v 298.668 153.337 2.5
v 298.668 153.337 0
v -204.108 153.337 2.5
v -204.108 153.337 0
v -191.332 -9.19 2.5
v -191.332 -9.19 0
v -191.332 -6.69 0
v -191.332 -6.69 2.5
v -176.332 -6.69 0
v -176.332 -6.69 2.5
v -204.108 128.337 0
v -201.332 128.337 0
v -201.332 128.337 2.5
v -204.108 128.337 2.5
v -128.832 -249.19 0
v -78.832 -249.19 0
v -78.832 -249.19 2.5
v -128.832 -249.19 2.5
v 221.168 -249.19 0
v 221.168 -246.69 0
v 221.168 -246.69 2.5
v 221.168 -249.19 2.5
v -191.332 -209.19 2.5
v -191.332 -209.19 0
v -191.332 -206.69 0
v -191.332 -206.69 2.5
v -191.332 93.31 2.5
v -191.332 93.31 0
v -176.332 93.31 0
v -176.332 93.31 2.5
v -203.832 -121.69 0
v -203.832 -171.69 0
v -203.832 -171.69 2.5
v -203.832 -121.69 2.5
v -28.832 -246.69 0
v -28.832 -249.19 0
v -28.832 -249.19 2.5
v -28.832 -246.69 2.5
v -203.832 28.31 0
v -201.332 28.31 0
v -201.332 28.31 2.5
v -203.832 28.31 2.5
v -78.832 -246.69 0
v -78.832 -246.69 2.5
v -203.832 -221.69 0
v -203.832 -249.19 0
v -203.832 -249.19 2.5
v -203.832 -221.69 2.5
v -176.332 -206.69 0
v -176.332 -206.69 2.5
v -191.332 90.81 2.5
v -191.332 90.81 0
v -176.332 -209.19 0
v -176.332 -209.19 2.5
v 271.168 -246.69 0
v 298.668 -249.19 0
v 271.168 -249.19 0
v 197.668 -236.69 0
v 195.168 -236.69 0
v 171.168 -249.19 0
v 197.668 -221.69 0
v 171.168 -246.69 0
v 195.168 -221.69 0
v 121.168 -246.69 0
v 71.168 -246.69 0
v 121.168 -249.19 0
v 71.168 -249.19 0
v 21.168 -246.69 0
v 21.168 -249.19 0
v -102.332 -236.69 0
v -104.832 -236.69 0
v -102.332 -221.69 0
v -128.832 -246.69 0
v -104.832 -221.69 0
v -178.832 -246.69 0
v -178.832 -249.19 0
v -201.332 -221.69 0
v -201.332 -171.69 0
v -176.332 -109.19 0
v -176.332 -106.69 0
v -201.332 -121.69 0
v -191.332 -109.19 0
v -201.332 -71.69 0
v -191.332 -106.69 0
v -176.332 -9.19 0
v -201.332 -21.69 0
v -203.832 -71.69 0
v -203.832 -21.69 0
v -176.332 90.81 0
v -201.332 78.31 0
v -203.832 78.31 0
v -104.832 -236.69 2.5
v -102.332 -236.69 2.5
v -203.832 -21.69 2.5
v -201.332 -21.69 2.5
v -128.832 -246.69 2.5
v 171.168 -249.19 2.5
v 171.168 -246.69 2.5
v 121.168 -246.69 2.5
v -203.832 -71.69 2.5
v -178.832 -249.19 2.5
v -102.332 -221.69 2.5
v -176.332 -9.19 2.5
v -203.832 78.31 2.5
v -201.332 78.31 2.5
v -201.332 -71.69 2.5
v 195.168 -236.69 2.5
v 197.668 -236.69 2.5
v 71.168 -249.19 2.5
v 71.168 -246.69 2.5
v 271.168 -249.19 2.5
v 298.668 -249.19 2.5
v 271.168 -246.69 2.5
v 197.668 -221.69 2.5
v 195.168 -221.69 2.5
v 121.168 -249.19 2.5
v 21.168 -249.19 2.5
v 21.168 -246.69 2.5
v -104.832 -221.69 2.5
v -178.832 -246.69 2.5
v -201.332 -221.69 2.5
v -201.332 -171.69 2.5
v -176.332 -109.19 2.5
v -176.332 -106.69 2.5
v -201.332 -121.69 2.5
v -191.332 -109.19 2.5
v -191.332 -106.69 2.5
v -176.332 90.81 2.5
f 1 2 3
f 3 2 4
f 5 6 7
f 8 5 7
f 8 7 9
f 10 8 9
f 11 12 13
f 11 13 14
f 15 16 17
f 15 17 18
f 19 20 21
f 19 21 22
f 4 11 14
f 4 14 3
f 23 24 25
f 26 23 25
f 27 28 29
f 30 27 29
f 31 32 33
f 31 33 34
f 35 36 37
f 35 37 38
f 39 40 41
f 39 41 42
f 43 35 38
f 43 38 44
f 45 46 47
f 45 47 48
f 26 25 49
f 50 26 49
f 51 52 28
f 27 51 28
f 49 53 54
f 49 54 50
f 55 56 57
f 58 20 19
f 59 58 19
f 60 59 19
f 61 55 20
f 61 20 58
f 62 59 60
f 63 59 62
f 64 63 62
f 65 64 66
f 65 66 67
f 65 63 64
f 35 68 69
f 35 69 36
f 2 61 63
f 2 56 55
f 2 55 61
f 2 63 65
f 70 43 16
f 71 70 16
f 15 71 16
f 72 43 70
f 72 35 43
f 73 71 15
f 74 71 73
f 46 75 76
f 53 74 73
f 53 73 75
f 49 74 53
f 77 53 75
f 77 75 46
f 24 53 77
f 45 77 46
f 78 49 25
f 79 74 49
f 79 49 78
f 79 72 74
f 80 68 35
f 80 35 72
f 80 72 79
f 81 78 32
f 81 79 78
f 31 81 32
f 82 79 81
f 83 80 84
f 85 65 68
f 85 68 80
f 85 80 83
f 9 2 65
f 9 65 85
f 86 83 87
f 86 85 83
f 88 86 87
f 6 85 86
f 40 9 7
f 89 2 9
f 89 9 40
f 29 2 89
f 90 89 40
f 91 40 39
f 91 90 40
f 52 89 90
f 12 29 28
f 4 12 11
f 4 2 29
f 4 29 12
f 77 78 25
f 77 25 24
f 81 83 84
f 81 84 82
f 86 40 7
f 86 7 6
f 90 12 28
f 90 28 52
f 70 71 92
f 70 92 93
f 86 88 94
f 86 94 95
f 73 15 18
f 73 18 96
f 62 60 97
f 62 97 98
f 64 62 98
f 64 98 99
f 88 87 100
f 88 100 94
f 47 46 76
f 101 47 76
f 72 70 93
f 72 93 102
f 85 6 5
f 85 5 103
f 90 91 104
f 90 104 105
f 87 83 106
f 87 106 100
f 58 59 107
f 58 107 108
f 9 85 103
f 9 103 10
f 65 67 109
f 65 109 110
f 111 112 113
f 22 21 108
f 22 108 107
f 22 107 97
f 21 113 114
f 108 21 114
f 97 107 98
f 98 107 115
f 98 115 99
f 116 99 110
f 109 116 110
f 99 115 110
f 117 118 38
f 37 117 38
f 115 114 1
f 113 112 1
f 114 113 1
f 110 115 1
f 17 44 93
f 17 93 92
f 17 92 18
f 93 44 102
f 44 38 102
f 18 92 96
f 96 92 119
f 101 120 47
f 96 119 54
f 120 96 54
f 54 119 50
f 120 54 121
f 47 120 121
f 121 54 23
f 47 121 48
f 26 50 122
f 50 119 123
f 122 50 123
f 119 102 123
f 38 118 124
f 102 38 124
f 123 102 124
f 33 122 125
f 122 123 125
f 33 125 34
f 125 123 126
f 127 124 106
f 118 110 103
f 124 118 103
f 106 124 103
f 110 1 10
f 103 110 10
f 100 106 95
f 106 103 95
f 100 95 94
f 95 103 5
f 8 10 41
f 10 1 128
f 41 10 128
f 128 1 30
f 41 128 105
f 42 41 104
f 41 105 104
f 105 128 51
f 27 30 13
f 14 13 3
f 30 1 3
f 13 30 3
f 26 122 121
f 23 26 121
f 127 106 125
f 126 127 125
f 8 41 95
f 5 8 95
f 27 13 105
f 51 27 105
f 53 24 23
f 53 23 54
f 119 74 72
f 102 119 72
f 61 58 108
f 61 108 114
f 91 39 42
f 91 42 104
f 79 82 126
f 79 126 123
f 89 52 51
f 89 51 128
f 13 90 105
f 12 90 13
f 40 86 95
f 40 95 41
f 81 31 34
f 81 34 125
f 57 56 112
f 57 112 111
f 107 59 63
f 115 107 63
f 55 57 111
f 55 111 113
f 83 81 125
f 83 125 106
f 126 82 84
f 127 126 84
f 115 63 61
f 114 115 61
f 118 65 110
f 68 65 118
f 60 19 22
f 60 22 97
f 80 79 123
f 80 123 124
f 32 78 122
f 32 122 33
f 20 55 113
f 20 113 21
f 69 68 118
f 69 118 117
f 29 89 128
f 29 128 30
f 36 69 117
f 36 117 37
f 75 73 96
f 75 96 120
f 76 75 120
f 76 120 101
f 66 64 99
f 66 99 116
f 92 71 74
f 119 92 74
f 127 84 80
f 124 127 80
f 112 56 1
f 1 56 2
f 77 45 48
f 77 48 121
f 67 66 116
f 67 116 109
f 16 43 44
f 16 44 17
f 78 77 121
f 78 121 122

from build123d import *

# Parameters (mm, degrees)
SKETCH1_W           = 15
SKETCH1_H           = 2.5
SKETCH1_W_2         = 2.5
SKETCH1_H_2         = 15
BOSS_EXTRUDE1_DEPTH = 2.5


with BuildPart() as part:
    # Sketch1 → Boss-Extrude1 (new body)
    with BuildSketch(Plane.XY):
        Polygon((-178.831793337, 153.336874277), (298.668206663, 153.336874277), (298.668206663, 135.823489403), (298.668206663, -229.176510597), (298.668206663, -249.18989547), (271.168206663, -249.18989547), (271.168206662, -246.68989547), (221.168206662, -246.68989547), (221.168206662, -249.18989547), (171.168206662, -249.18989547), (171.168206662, -246.68989547), (121.168206662, -246.68989547), (121.168206662, -249.18989547), (71.168206663, -249.18989547), (71.168206663, -246.68989547), (21.168206663, -246.68989547), (21.168206663, -249.18989547), (-28.831793337, -249.18989547), (-28.831793337, -246.68989547), (-78.831793337, -246.68989547), (-78.831793337, -249.18989547), (-128.831793337, -249.18989547), (-128.831793337, -246.68989547), (-178.831793337, -246.68989547), (-178.831793337, -249.18989547), (-201.331793337, -249.18989547), (-203.831793337, -249.18989547), (-203.831793337, -221.68989547), (-201.331793337, -221.68989547), (-201.331793337, -171.68989547), (-203.831793337, -171.68989547), (-203.831793337, -121.68989547), (-201.331793337, -121.68989547), (-201.331793337, -71.68989547), (-203.831793337, -71.68989547), (-203.831793337, -21.68989547), (-201.331793337, -21.68989547), (-201.331793337, 28.31010453), (-203.831793337, 28.31010453), (-203.831793337, 78.31010453), (-201.331793337, 78.31010453), (-201.331793337, 128.336874277), (-204.108332232, 128.336874277), (-204.108332232, 153.336874277), (-201.718717054, 153.336874277), align=None)
        with Locations((-183.831793337, -107.93989547)):
            Rectangle(SKETCH1_W, SKETCH1_H, mode=Mode.SUBTRACT)
        with Locations((-183.831793337, -207.93989547)):
            Rectangle(SKETCH1_W, SKETCH1_H, mode=Mode.SUBTRACT)
        with Locations((-183.831793337, -7.93989547)):
            Rectangle(SKETCH1_W, SKETCH1_H, mode=Mode.SUBTRACT)
        with Locations((-183.831793337, 92.06010453)):
            Rectangle(SKETCH1_W, SKETCH1_H, mode=Mode.SUBTRACT)
        with Locations((-103.581793337, -229.18989547)):
            Rectangle(SKETCH1_W_2, SKETCH1_H_2, mode=Mode.SUBTRACT)
        with Locations((196.418206663, -229.18989547)):
            Rectangle(SKETCH1_W_2, SKETCH1_H_2, mode=Mode.SUBTRACT)
    extrude(amount=BOSS_EXTRUDE1_DEPTH)


solid = part.part
